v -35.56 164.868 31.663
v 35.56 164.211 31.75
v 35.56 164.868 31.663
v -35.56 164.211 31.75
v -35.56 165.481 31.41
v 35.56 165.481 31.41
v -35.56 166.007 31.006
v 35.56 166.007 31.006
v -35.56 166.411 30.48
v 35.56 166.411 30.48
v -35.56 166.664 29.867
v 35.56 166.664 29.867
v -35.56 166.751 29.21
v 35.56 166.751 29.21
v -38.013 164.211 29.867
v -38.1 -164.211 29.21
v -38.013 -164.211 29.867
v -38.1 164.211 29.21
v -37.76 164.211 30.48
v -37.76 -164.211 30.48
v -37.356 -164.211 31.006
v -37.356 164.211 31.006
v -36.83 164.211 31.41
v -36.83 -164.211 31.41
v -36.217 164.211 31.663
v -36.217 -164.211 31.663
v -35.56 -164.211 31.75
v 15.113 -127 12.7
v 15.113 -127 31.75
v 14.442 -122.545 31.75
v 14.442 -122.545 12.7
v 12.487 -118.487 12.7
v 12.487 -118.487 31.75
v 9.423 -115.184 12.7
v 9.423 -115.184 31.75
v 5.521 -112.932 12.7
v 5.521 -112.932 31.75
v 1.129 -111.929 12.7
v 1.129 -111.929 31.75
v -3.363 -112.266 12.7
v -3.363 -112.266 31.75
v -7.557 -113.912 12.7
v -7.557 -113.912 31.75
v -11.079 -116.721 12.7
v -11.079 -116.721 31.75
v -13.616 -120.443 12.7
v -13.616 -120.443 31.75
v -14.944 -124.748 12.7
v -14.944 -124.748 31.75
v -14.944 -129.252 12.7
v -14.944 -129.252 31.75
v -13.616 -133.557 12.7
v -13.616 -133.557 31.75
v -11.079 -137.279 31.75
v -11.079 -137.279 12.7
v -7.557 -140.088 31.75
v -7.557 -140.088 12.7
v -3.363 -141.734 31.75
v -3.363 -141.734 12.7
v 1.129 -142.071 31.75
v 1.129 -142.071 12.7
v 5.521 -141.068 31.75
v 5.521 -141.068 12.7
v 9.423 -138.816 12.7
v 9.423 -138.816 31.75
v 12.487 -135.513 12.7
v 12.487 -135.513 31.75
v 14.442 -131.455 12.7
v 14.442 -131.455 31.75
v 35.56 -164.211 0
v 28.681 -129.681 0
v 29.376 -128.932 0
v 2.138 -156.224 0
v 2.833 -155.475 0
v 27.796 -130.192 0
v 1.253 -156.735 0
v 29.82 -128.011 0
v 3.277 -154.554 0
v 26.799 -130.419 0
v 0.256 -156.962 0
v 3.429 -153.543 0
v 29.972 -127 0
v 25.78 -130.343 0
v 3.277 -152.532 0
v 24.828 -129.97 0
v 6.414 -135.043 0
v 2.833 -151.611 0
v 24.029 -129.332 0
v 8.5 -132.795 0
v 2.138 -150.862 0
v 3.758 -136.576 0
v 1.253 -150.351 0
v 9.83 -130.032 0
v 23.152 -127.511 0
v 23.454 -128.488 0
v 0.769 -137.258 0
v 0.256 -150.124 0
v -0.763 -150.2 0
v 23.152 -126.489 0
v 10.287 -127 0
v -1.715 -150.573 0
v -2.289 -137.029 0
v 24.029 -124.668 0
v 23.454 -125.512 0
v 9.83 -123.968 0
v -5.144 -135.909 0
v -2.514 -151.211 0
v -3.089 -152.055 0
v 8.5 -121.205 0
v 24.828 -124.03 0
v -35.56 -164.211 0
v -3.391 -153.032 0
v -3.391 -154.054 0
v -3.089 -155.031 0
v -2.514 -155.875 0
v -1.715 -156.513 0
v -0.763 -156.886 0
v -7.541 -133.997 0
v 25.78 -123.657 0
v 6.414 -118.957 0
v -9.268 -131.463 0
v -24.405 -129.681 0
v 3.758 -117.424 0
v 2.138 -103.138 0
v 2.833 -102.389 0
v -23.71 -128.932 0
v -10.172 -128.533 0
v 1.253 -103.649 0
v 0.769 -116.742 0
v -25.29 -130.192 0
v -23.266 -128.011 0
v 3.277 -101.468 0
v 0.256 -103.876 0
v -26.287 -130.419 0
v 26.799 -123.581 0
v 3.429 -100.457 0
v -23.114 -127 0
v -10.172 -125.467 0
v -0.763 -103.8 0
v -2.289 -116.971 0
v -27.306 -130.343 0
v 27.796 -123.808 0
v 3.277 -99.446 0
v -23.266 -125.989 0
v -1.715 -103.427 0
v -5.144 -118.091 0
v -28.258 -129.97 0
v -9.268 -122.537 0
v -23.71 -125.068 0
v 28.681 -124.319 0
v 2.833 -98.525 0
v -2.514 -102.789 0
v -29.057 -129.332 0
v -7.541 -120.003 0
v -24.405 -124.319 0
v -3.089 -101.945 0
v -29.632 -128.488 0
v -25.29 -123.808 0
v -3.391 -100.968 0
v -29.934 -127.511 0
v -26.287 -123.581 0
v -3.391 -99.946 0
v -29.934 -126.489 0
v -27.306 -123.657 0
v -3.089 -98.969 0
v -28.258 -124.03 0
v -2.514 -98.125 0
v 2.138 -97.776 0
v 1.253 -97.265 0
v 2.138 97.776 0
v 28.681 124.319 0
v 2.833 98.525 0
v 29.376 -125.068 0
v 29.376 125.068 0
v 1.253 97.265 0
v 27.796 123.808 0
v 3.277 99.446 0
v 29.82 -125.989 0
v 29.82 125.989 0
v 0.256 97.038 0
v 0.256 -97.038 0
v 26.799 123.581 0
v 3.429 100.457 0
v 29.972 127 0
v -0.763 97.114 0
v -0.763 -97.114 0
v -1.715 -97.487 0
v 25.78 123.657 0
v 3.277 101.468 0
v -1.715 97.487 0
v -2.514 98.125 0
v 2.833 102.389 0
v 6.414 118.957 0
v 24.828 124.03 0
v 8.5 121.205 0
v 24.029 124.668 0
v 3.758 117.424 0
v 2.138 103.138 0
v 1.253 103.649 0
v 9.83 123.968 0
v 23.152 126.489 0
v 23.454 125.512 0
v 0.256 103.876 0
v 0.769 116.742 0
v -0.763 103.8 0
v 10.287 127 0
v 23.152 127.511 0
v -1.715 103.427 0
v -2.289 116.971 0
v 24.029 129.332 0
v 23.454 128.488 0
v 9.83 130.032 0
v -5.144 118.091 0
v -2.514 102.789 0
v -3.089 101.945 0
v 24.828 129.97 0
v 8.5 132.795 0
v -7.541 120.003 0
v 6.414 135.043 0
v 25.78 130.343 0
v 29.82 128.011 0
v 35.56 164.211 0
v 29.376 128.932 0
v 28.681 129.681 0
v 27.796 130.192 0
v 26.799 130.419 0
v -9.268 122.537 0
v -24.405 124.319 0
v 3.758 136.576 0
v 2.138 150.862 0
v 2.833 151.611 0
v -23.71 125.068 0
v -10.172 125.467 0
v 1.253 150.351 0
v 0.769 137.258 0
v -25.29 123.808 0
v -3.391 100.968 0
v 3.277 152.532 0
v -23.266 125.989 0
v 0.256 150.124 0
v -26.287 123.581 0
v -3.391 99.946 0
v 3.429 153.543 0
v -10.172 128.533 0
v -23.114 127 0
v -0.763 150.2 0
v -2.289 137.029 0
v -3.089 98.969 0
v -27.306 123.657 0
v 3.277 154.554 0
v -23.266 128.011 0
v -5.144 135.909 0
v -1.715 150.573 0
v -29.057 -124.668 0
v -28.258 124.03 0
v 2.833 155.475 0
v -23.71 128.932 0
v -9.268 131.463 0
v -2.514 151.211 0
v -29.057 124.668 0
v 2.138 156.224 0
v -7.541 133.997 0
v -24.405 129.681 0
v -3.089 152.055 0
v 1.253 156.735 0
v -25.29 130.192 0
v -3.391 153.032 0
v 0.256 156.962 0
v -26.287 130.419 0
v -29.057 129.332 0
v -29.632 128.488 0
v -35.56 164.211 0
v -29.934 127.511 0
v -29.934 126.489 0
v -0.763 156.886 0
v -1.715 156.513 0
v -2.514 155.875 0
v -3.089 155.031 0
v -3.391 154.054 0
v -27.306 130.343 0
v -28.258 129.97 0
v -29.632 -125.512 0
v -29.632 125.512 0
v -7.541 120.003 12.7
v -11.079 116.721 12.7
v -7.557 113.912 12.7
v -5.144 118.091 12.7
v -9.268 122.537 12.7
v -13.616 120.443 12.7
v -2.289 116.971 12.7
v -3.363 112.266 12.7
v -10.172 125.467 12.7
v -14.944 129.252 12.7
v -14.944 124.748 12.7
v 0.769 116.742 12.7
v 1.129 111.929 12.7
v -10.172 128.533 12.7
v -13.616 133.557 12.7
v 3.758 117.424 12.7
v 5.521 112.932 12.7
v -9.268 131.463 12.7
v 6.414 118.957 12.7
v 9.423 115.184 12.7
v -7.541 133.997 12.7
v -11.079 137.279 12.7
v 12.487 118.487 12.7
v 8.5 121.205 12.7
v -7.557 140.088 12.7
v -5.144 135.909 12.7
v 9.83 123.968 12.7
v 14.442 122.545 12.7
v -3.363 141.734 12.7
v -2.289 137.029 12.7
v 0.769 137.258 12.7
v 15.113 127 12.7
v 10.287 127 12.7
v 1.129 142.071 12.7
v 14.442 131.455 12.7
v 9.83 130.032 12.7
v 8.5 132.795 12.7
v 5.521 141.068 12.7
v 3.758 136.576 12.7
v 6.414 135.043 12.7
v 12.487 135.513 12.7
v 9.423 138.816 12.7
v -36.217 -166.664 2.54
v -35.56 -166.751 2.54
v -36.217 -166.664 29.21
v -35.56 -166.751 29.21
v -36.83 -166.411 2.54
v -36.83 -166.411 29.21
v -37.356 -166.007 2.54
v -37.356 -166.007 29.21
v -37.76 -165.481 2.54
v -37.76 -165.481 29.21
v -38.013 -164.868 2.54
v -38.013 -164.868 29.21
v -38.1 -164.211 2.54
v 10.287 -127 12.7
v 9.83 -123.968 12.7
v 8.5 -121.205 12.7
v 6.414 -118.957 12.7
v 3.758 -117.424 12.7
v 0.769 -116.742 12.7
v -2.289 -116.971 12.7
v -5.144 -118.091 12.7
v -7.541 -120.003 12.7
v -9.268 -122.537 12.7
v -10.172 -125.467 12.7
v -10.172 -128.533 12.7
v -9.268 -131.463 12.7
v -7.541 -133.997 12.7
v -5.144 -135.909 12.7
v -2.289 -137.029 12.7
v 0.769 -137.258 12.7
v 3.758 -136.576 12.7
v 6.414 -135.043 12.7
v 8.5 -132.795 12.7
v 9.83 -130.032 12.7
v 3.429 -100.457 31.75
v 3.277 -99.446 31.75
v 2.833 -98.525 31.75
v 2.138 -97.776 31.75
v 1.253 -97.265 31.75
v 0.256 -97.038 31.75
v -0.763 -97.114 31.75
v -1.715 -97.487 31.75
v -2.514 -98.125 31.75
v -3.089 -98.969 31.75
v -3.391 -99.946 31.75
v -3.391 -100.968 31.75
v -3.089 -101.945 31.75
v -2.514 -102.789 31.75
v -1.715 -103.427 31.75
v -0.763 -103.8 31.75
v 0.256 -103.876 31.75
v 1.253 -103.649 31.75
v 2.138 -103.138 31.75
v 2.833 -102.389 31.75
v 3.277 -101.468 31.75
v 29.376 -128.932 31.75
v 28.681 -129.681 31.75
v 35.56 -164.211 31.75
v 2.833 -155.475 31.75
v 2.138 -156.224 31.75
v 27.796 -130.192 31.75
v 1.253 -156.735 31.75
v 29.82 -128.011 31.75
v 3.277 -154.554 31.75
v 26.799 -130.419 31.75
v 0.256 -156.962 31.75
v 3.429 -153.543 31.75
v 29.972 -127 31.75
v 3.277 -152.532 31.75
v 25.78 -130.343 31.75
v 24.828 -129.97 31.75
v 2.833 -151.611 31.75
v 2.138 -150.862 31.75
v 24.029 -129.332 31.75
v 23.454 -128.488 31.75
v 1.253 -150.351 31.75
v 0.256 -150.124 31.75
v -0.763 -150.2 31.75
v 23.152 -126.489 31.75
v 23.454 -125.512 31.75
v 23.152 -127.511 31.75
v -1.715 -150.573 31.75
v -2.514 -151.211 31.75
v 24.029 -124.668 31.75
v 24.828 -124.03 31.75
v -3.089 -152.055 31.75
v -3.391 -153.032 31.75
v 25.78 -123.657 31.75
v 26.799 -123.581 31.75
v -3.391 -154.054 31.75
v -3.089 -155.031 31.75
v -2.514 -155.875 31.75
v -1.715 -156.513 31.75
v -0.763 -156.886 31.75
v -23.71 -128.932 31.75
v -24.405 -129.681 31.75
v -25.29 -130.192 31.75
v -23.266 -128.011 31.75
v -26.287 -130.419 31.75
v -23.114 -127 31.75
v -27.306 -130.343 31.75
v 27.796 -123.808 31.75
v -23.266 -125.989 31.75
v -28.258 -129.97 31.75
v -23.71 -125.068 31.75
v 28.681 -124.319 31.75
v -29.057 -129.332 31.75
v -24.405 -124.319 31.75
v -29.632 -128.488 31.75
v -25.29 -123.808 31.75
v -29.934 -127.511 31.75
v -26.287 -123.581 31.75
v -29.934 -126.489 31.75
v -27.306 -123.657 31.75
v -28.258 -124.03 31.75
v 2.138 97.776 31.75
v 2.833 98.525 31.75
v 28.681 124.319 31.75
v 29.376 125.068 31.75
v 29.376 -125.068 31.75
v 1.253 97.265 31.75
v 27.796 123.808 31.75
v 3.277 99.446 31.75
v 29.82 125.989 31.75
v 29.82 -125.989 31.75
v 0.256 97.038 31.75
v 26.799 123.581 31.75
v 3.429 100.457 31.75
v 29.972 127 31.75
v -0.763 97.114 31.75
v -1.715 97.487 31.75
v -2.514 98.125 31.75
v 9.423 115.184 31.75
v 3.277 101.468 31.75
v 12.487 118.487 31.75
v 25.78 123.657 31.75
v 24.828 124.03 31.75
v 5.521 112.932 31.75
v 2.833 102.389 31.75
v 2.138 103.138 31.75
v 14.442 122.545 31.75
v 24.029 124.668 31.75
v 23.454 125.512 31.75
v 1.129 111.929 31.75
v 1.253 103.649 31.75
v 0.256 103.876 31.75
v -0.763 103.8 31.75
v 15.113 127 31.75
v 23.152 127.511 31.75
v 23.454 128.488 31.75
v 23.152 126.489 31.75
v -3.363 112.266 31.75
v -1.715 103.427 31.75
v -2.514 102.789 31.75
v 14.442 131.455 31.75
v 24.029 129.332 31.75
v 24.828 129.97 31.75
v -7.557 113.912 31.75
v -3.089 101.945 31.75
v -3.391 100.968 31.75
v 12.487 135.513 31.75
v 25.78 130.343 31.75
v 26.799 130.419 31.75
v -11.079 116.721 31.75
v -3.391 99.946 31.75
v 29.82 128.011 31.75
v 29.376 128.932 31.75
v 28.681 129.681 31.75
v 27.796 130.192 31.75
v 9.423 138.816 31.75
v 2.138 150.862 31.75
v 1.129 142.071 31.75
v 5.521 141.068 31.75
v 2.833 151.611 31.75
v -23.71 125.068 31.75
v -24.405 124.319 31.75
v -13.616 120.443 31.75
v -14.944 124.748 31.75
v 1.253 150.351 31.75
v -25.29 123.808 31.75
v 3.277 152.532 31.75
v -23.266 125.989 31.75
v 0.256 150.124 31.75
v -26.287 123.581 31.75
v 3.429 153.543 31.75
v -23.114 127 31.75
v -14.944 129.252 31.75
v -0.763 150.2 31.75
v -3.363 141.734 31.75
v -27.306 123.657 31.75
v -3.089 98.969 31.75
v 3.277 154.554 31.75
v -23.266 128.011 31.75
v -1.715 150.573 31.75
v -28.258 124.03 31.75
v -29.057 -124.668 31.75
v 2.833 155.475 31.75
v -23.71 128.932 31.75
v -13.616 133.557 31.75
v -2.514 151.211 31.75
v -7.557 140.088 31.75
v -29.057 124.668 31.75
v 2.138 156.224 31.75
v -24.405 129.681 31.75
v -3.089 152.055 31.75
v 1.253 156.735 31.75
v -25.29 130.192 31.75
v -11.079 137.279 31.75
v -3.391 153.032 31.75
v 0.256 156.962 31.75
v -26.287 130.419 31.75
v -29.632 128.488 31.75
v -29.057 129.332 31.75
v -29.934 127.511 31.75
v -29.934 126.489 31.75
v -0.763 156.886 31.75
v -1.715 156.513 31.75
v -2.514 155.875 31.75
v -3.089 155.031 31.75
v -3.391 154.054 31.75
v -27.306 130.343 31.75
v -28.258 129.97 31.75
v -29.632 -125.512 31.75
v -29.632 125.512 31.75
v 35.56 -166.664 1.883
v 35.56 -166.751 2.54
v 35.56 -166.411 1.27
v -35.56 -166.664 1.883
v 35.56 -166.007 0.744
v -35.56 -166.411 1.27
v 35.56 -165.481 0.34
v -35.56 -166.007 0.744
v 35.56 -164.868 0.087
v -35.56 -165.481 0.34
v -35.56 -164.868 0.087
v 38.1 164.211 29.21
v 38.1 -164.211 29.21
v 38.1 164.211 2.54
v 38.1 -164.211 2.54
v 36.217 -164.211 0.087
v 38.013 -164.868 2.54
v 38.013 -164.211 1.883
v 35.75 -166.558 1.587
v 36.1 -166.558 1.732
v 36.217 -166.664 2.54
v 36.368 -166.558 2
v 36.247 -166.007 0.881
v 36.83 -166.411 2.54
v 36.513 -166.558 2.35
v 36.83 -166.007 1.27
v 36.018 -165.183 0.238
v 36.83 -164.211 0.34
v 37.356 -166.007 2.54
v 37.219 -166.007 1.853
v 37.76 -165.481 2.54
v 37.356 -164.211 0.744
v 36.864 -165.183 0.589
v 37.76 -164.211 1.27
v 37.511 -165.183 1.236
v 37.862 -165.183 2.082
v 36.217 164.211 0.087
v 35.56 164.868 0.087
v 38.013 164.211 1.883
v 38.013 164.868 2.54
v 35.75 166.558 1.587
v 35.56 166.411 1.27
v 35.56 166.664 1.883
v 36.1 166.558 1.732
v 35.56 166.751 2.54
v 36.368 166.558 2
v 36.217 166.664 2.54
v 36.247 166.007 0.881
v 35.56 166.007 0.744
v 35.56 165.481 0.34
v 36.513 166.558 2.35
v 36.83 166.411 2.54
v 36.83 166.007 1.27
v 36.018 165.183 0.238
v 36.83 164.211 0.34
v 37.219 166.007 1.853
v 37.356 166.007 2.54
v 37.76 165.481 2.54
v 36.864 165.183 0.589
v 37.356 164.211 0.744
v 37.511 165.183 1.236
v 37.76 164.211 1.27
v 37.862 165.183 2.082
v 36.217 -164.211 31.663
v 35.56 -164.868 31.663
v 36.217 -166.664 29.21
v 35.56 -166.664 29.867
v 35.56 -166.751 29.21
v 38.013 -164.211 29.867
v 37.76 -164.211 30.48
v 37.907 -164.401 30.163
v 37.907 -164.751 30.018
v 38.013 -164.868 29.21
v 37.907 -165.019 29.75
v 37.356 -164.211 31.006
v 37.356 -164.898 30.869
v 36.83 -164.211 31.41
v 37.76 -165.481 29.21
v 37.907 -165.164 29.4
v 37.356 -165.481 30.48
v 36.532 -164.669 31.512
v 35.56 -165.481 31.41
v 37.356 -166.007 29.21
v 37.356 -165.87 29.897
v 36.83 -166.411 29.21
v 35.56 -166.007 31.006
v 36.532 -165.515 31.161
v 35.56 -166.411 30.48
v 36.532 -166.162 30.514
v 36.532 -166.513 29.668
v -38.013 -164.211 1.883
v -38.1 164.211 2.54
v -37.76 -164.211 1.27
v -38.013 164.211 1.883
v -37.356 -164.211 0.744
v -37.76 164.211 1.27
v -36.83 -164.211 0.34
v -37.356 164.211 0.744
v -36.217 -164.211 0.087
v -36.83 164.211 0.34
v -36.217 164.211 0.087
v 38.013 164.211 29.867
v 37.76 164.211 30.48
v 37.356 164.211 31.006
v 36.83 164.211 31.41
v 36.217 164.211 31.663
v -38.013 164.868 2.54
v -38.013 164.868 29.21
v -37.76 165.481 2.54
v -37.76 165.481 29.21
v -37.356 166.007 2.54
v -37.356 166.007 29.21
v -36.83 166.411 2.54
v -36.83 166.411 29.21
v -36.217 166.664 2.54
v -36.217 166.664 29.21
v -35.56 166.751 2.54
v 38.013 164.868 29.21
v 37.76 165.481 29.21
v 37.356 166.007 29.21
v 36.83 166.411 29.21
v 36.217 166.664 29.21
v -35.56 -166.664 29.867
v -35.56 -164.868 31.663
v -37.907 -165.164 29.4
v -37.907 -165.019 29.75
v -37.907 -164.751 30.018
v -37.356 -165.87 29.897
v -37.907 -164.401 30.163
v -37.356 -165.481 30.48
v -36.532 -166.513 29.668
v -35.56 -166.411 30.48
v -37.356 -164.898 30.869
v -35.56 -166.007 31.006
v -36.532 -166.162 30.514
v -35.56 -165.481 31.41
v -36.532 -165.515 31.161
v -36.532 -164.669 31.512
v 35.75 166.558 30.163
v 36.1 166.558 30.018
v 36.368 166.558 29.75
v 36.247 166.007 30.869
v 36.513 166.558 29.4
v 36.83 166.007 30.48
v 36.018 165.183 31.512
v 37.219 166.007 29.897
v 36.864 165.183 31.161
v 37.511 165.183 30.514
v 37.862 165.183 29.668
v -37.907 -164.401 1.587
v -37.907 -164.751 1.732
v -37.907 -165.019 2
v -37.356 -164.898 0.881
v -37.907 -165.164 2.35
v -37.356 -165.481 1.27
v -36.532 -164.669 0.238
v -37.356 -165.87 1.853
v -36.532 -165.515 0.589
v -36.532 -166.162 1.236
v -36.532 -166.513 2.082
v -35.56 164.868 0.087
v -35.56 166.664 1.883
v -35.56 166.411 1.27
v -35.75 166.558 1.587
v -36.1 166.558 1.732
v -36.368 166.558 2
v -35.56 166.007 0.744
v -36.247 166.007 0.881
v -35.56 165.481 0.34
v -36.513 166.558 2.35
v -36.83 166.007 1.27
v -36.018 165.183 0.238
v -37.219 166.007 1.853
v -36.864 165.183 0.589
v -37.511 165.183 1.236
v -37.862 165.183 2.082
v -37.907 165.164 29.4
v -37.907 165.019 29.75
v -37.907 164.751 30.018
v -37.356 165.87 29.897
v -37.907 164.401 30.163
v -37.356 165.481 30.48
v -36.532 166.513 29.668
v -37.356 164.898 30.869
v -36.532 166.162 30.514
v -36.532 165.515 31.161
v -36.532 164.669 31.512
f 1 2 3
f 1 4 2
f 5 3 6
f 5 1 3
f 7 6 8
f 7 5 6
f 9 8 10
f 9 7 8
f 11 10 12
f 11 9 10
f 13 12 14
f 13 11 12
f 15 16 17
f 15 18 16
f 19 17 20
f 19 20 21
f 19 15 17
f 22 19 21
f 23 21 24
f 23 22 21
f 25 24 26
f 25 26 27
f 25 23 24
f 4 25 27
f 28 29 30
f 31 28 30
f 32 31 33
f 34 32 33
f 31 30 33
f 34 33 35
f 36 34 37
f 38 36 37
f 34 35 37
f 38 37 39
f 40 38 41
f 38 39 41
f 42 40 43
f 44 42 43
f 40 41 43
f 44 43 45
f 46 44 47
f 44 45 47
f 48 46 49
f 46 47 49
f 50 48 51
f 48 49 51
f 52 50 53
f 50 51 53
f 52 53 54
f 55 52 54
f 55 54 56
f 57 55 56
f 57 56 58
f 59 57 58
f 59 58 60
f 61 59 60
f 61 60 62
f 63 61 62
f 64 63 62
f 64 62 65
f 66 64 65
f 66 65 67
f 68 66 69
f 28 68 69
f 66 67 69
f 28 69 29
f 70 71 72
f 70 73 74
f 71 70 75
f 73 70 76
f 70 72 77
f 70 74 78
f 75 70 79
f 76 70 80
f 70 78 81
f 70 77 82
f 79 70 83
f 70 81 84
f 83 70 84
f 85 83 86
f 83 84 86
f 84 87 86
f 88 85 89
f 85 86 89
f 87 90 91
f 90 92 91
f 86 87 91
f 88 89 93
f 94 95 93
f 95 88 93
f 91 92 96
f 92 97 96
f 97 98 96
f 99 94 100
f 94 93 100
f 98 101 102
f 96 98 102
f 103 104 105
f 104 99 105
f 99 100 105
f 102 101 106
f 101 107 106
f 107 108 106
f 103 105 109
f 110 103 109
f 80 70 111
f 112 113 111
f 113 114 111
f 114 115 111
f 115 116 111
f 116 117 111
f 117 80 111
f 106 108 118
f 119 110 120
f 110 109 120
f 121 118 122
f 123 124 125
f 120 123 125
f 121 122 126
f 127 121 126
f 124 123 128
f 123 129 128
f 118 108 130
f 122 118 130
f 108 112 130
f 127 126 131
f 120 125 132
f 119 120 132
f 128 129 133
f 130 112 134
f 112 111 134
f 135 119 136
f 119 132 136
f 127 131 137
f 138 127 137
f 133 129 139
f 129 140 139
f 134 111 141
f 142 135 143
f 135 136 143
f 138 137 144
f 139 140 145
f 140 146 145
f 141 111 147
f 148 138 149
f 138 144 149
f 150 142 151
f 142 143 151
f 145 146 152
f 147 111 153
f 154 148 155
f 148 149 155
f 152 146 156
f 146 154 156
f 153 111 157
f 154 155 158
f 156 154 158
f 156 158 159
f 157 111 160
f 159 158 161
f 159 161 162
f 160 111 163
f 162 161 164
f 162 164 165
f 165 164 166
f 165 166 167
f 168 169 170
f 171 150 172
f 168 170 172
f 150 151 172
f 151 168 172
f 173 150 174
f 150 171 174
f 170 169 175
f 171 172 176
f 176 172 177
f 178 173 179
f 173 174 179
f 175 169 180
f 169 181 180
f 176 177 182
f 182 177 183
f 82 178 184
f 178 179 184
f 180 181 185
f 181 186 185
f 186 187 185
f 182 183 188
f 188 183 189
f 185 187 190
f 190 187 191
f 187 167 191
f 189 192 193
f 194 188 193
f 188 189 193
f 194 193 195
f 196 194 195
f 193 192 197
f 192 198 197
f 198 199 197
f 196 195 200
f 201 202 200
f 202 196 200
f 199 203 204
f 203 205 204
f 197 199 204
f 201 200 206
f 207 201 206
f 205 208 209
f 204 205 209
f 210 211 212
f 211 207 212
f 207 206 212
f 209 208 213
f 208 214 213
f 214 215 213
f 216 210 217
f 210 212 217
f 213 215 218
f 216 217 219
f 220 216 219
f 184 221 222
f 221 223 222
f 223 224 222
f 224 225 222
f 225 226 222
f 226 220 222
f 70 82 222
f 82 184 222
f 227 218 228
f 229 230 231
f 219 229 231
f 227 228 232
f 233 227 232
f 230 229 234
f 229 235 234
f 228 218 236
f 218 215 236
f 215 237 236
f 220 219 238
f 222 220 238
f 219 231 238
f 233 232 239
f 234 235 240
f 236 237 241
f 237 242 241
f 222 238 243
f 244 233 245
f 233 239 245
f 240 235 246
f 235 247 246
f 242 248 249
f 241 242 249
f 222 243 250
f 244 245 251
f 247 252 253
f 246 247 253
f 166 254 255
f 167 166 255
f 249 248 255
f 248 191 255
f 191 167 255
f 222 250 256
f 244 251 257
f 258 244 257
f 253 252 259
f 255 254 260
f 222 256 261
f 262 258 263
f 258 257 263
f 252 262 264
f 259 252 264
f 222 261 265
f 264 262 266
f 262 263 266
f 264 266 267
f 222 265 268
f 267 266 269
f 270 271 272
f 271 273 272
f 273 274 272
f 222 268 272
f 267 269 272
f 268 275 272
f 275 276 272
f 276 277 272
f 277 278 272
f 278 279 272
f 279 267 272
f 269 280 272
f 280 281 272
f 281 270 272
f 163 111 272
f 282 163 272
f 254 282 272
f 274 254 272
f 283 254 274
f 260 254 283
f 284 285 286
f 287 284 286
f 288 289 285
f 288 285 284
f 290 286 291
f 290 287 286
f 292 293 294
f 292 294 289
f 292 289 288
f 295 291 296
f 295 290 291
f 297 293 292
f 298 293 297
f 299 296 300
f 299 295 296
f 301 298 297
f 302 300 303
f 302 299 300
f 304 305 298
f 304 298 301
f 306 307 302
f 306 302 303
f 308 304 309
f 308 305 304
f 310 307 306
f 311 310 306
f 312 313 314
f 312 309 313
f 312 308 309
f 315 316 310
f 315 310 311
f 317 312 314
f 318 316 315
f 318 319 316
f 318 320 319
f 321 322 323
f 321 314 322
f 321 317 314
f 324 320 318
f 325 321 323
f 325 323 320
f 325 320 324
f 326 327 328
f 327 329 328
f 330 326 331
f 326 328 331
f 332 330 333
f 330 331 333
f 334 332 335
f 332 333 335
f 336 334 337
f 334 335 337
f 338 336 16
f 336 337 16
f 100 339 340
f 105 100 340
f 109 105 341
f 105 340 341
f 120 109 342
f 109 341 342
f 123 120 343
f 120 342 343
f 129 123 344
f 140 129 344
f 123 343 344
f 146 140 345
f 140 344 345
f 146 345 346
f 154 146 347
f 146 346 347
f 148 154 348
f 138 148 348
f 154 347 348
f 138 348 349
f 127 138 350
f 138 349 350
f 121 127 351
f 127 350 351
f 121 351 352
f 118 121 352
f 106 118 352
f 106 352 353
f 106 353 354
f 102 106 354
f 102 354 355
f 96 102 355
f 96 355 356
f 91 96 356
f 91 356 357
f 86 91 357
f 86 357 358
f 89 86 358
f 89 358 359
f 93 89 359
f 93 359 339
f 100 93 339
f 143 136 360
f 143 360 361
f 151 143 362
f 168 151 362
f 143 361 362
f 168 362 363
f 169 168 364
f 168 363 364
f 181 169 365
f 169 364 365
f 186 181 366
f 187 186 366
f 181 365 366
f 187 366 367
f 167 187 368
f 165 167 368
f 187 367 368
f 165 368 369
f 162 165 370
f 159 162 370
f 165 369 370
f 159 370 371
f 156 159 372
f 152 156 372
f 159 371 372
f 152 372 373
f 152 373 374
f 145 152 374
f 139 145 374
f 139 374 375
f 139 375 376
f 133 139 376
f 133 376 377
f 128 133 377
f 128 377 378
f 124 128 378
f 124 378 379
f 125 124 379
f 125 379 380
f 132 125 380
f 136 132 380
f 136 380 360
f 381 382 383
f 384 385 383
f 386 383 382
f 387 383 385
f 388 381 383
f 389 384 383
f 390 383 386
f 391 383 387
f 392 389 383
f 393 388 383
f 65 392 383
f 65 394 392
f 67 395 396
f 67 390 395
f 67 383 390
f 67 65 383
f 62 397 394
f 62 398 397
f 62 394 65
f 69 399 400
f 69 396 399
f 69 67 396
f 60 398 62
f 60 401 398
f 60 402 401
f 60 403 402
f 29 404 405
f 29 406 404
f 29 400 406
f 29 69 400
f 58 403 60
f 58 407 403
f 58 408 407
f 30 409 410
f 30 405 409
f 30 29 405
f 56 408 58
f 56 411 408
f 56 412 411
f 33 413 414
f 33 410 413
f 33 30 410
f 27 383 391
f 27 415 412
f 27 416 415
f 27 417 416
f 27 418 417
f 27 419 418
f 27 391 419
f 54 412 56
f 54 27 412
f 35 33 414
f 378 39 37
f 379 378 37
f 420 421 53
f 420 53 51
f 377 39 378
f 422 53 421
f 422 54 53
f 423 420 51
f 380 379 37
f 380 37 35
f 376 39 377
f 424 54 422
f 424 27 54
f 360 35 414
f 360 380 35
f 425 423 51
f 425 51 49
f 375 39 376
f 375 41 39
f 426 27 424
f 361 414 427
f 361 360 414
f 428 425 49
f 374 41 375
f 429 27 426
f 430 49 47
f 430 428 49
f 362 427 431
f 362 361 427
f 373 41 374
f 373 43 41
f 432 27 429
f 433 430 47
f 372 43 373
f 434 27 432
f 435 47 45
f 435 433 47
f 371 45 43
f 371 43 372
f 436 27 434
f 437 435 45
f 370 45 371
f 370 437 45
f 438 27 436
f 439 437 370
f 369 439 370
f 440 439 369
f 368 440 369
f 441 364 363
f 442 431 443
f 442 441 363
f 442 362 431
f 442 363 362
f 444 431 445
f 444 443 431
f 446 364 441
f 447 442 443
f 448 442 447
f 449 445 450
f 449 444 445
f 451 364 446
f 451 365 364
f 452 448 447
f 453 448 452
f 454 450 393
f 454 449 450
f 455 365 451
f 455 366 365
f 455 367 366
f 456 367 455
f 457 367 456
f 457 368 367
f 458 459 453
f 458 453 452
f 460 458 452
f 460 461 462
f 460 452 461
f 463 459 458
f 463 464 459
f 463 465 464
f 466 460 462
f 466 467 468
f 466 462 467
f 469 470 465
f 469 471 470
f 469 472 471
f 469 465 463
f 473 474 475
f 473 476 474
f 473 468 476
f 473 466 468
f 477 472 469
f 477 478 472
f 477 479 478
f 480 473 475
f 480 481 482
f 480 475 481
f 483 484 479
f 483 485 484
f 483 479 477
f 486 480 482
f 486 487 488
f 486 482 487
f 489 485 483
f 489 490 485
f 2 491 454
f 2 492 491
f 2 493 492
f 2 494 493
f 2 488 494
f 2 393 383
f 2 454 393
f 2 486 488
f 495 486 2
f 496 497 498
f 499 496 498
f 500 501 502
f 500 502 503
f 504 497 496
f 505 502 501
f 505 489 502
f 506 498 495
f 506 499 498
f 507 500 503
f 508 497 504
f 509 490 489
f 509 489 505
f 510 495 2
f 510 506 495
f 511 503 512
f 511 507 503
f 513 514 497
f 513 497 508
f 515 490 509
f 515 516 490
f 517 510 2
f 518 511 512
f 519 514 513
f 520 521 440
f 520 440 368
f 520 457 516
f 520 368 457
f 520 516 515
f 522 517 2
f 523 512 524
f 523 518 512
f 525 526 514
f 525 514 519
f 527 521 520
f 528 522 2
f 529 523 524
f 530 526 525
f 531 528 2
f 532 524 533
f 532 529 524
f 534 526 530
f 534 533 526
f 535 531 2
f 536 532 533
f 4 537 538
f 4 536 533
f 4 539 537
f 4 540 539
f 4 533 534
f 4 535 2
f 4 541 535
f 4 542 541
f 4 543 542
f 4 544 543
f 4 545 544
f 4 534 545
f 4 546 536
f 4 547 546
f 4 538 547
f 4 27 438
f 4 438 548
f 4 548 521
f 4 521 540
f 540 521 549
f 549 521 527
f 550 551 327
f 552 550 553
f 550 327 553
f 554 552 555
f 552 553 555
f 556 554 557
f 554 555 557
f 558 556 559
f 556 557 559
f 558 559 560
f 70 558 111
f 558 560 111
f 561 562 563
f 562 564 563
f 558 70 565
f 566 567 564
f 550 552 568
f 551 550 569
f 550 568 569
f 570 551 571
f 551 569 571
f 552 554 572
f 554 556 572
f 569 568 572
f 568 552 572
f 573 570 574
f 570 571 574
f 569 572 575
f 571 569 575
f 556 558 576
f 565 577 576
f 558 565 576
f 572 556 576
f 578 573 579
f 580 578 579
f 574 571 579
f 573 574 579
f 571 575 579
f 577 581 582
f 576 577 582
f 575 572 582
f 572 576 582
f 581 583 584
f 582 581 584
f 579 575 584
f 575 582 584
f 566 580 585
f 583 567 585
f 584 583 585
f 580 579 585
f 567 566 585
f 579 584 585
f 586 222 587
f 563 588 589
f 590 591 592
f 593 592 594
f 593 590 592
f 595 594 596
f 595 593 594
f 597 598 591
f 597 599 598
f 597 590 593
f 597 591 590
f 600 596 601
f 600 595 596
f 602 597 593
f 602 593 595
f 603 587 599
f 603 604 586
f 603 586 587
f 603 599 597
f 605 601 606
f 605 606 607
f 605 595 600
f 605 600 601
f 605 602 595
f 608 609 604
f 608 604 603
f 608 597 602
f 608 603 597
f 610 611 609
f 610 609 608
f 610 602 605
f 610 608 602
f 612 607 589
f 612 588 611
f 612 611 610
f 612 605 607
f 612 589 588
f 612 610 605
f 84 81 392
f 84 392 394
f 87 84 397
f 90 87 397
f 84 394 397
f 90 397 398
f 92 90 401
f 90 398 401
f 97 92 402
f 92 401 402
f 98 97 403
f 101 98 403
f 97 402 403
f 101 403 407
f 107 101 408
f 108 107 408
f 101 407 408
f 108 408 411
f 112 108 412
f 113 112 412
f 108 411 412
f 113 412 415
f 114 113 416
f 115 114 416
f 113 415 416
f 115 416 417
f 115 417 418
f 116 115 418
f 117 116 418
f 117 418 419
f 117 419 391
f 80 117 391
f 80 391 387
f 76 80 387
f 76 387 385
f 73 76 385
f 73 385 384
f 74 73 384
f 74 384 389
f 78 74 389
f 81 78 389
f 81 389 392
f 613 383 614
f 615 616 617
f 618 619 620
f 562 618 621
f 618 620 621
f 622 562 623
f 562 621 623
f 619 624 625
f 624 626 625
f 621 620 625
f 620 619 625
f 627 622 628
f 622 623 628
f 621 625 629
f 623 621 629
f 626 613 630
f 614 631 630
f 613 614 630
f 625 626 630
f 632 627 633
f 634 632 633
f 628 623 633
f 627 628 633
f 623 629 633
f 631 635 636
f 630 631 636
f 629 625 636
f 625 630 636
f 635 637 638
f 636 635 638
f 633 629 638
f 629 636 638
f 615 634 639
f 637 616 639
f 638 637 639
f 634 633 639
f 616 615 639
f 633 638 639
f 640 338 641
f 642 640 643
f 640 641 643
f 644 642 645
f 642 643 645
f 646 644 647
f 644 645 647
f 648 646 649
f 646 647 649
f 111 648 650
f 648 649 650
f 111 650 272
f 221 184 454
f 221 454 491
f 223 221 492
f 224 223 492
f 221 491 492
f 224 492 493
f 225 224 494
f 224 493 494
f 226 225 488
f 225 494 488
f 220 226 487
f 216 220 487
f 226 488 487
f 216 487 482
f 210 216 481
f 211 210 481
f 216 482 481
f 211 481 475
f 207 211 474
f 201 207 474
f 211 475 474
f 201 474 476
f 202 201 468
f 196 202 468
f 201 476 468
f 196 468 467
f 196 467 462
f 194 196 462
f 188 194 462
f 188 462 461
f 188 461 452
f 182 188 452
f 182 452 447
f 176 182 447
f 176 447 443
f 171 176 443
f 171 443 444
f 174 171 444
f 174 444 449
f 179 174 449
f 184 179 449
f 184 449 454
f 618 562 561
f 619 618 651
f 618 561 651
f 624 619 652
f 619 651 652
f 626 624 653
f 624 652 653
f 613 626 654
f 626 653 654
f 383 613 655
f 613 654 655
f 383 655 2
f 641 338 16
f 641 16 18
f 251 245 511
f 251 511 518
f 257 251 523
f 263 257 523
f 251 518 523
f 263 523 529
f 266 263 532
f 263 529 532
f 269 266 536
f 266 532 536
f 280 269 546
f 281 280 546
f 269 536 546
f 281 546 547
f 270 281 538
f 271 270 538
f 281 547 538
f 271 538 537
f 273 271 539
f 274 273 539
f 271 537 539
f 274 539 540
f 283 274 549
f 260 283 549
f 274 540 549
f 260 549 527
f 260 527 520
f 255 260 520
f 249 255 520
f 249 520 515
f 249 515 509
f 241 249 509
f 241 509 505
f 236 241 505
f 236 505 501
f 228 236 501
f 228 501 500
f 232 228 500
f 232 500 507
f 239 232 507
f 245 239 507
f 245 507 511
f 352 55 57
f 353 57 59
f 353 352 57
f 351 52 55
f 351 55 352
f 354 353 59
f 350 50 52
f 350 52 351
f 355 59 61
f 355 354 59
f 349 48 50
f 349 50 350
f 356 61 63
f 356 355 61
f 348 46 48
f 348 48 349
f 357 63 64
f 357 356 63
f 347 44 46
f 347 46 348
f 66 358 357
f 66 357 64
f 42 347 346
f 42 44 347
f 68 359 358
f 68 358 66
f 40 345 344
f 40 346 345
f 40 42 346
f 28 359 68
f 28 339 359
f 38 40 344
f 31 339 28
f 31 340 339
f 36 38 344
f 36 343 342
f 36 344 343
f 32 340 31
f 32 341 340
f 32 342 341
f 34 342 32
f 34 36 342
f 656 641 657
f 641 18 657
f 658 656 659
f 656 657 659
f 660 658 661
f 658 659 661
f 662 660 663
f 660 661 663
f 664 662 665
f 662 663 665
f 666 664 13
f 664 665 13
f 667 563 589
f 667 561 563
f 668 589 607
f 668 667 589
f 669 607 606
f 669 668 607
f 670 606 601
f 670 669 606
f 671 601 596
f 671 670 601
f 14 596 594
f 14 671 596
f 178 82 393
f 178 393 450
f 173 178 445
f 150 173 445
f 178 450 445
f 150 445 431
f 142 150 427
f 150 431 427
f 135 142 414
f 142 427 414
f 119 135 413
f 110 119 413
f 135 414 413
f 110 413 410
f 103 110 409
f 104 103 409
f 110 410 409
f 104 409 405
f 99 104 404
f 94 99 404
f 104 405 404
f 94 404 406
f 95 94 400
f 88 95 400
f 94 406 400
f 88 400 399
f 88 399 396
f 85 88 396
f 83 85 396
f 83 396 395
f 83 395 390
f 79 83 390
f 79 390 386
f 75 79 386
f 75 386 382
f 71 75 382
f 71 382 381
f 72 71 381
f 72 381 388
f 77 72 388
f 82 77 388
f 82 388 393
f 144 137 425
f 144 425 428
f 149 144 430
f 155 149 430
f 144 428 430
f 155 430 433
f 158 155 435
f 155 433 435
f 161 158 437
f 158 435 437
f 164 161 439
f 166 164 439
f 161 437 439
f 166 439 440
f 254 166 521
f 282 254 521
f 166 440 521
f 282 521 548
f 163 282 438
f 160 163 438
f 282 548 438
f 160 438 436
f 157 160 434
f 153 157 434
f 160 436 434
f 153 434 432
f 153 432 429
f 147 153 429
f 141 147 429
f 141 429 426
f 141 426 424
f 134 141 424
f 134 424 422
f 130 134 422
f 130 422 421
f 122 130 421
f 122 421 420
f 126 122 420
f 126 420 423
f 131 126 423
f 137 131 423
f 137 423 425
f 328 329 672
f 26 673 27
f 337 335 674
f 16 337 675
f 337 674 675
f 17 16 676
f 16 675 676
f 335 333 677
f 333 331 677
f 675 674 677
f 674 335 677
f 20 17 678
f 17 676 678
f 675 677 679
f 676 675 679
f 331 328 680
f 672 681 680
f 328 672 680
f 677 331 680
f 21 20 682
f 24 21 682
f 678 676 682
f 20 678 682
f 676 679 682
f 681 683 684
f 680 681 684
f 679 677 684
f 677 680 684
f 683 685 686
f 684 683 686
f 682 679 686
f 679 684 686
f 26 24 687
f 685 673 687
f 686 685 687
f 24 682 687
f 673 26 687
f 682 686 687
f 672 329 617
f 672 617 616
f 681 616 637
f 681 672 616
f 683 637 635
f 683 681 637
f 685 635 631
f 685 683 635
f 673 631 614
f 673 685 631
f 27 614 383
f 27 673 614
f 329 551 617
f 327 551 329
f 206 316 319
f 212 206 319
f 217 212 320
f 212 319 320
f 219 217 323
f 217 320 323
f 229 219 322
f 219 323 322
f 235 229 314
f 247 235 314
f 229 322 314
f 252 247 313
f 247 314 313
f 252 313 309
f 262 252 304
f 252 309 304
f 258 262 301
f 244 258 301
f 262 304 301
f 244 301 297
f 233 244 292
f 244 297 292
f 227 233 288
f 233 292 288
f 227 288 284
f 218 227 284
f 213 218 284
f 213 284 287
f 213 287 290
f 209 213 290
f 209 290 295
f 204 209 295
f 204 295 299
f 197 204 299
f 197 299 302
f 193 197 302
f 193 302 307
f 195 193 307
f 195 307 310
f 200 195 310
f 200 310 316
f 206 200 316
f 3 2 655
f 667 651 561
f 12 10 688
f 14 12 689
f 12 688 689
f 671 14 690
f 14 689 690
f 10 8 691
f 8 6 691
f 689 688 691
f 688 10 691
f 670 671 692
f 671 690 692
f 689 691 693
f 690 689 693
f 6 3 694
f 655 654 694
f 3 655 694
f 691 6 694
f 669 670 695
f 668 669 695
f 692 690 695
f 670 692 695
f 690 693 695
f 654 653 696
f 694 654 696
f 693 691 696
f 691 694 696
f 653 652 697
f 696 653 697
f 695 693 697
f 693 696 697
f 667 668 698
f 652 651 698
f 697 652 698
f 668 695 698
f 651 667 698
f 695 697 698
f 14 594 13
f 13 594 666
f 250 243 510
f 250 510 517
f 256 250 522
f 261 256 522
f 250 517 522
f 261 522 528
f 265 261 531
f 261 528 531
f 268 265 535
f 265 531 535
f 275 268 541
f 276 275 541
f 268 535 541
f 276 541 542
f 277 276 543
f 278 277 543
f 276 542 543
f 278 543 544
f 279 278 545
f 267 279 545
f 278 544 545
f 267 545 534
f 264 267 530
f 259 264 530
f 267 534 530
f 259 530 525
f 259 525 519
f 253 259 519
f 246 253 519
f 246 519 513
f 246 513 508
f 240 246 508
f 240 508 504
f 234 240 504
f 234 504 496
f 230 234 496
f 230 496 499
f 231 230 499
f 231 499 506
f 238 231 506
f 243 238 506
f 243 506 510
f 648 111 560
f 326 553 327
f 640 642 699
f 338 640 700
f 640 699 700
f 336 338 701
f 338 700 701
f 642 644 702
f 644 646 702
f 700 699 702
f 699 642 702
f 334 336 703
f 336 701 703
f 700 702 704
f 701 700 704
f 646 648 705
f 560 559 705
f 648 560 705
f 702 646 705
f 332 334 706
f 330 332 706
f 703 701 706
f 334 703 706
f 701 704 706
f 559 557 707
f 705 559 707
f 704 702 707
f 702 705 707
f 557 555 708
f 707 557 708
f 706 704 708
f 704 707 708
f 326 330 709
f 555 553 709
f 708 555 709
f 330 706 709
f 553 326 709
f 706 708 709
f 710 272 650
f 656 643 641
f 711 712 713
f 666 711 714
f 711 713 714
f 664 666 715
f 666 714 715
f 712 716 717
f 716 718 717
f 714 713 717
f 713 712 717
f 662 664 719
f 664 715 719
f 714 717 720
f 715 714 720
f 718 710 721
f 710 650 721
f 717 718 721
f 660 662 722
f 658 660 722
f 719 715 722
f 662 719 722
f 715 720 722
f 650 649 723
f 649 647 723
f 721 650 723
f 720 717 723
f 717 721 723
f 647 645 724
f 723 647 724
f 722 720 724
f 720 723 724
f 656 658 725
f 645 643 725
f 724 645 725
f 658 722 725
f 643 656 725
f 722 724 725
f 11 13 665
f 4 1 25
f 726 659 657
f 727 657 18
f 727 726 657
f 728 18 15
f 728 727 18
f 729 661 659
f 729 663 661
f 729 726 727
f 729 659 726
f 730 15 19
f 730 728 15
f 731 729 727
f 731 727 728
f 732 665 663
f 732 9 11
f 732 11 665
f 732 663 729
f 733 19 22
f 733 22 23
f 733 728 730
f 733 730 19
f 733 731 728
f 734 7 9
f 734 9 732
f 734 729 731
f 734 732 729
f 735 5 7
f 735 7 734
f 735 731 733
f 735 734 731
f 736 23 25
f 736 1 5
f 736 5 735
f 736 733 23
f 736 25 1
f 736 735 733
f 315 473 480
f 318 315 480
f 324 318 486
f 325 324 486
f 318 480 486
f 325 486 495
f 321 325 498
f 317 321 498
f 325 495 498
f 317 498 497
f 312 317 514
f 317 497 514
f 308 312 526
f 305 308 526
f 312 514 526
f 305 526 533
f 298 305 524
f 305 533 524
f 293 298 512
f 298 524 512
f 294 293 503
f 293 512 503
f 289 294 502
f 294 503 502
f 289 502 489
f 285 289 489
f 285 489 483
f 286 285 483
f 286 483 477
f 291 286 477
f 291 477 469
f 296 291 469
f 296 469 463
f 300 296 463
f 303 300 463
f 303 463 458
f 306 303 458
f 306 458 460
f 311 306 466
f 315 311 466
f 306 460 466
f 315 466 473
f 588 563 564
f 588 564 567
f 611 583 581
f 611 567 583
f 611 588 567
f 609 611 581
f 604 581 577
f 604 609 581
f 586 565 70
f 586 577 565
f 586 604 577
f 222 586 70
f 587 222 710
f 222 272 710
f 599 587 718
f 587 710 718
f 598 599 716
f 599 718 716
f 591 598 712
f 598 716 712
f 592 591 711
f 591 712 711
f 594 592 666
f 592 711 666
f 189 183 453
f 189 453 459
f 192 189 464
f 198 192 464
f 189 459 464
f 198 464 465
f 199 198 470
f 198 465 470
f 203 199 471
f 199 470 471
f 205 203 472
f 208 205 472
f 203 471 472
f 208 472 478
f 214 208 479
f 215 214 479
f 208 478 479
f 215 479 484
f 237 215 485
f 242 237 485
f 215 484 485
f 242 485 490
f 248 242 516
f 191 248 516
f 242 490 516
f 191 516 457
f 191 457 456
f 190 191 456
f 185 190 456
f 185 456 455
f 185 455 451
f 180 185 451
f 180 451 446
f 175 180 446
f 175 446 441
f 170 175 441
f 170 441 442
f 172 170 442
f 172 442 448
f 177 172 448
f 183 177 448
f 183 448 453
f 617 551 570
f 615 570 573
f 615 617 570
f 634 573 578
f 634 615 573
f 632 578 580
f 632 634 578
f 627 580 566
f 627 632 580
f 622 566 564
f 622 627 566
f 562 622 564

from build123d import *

# Parameters (mm, degrees)
SKETCH1_W           = 333.502
SKETCH1_H           = 76.2
BOSS_EXTRUDE1_DEPTH = 31.75
SKETCH2_R           = 15.113
CUT_EXTRUDE1_DEPTH  = 19.05
SKETCH3_R           = 10.287
CUT_EXTRUDE2_DEPTH  = 173.105806122
SKETCH4_R           = 3.429
CUT_EXTRUDE3_DEPTH  = 174.970021846
FILLET1_R           = 2.54


with BuildPart() as part:
    # Sketch1 → Boss-Extrude1 (new body)
    with BuildSketch(Plane(origin=(0, 0, 0), x_dir=(0, 1, 0), z_dir=(0, 0, 1))):
        Rectangle(SKETCH1_W, SKETCH1_H)
    extrude(amount=BOSS_EXTRUDE1_DEPTH)

    # Sketch2 → Cut-Extrude1 (cut)
    with BuildSketch(Plane.XY.offset(31.75)):
        with Locations((0, 127)):
            Circle(SKETCH2_R)
        with Locations((0, -127)):
            Circle(SKETCH2_R)
    extrude(amount=-CUT_EXTRUDE1_DEPTH, mode=Mode.SUBTRACT)

    # Sketch3 → Cut-Extrude2 (cut, through all)
    with BuildSketch(Plane.XY.offset(12.7)):
        with Locations((0, -127)):
            Circle(SKETCH3_R)
        with Locations((0, 127)):
            Circle(SKETCH3_R)
    extrude(amount=-CUT_EXTRUDE2_DEPTH, mode=Mode.SUBTRACT)

    # Sketch4 → Cut-Extrude3 (cut, through all)
    with BuildSketch(Plane.XY.offset(31.75)):
        with Locations((-26.543, 127)):
            Circle(SKETCH4_R)
        with Locations((0, 153.543)):
            Circle(SKETCH4_R)
        with Locations((26.543, 127)):
            Circle(SKETCH4_R)
        with Locations((0, 100.457)):
            Circle(SKETCH4_R)
        with Locations((0, -100.457)):
            Circle(SKETCH4_R)
        with Locations((26.543, -127)):
            Circle(SKETCH4_R)
        with Locations((0, -153.543)):
            Circle(SKETCH4_R)
        with Locations((-26.543, -127)):
            Circle(SKETCH4_R)
    extrude(amount=-CUT_EXTRUDE3_DEPTH, mode=Mode.SUBTRACT)

    # Fillet1
    fillet1_edges = [part.edges().sort_by_distance(p)[0] for p in [
        (0, -166.751, 31.75),
        (38.1, 0, 31.75),
        (0, 166.751, 31.75),
        (38.1, 0, 0),
        (0, -166.751, 0),
        (-38.1, 0, 0),
        (0, 166.751, 0),
        (38.1, 166.751, 15.875),
        (38.1, -166.751, 15.875),
        (-38.1, -166.751, 15.875),
        (-38.1, 166.751, 15.875),
        (-38.1, 0, 31.75),
    ]]
    fillet(fillet1_edges, radius=FILLET1_R)


solid = part.part
